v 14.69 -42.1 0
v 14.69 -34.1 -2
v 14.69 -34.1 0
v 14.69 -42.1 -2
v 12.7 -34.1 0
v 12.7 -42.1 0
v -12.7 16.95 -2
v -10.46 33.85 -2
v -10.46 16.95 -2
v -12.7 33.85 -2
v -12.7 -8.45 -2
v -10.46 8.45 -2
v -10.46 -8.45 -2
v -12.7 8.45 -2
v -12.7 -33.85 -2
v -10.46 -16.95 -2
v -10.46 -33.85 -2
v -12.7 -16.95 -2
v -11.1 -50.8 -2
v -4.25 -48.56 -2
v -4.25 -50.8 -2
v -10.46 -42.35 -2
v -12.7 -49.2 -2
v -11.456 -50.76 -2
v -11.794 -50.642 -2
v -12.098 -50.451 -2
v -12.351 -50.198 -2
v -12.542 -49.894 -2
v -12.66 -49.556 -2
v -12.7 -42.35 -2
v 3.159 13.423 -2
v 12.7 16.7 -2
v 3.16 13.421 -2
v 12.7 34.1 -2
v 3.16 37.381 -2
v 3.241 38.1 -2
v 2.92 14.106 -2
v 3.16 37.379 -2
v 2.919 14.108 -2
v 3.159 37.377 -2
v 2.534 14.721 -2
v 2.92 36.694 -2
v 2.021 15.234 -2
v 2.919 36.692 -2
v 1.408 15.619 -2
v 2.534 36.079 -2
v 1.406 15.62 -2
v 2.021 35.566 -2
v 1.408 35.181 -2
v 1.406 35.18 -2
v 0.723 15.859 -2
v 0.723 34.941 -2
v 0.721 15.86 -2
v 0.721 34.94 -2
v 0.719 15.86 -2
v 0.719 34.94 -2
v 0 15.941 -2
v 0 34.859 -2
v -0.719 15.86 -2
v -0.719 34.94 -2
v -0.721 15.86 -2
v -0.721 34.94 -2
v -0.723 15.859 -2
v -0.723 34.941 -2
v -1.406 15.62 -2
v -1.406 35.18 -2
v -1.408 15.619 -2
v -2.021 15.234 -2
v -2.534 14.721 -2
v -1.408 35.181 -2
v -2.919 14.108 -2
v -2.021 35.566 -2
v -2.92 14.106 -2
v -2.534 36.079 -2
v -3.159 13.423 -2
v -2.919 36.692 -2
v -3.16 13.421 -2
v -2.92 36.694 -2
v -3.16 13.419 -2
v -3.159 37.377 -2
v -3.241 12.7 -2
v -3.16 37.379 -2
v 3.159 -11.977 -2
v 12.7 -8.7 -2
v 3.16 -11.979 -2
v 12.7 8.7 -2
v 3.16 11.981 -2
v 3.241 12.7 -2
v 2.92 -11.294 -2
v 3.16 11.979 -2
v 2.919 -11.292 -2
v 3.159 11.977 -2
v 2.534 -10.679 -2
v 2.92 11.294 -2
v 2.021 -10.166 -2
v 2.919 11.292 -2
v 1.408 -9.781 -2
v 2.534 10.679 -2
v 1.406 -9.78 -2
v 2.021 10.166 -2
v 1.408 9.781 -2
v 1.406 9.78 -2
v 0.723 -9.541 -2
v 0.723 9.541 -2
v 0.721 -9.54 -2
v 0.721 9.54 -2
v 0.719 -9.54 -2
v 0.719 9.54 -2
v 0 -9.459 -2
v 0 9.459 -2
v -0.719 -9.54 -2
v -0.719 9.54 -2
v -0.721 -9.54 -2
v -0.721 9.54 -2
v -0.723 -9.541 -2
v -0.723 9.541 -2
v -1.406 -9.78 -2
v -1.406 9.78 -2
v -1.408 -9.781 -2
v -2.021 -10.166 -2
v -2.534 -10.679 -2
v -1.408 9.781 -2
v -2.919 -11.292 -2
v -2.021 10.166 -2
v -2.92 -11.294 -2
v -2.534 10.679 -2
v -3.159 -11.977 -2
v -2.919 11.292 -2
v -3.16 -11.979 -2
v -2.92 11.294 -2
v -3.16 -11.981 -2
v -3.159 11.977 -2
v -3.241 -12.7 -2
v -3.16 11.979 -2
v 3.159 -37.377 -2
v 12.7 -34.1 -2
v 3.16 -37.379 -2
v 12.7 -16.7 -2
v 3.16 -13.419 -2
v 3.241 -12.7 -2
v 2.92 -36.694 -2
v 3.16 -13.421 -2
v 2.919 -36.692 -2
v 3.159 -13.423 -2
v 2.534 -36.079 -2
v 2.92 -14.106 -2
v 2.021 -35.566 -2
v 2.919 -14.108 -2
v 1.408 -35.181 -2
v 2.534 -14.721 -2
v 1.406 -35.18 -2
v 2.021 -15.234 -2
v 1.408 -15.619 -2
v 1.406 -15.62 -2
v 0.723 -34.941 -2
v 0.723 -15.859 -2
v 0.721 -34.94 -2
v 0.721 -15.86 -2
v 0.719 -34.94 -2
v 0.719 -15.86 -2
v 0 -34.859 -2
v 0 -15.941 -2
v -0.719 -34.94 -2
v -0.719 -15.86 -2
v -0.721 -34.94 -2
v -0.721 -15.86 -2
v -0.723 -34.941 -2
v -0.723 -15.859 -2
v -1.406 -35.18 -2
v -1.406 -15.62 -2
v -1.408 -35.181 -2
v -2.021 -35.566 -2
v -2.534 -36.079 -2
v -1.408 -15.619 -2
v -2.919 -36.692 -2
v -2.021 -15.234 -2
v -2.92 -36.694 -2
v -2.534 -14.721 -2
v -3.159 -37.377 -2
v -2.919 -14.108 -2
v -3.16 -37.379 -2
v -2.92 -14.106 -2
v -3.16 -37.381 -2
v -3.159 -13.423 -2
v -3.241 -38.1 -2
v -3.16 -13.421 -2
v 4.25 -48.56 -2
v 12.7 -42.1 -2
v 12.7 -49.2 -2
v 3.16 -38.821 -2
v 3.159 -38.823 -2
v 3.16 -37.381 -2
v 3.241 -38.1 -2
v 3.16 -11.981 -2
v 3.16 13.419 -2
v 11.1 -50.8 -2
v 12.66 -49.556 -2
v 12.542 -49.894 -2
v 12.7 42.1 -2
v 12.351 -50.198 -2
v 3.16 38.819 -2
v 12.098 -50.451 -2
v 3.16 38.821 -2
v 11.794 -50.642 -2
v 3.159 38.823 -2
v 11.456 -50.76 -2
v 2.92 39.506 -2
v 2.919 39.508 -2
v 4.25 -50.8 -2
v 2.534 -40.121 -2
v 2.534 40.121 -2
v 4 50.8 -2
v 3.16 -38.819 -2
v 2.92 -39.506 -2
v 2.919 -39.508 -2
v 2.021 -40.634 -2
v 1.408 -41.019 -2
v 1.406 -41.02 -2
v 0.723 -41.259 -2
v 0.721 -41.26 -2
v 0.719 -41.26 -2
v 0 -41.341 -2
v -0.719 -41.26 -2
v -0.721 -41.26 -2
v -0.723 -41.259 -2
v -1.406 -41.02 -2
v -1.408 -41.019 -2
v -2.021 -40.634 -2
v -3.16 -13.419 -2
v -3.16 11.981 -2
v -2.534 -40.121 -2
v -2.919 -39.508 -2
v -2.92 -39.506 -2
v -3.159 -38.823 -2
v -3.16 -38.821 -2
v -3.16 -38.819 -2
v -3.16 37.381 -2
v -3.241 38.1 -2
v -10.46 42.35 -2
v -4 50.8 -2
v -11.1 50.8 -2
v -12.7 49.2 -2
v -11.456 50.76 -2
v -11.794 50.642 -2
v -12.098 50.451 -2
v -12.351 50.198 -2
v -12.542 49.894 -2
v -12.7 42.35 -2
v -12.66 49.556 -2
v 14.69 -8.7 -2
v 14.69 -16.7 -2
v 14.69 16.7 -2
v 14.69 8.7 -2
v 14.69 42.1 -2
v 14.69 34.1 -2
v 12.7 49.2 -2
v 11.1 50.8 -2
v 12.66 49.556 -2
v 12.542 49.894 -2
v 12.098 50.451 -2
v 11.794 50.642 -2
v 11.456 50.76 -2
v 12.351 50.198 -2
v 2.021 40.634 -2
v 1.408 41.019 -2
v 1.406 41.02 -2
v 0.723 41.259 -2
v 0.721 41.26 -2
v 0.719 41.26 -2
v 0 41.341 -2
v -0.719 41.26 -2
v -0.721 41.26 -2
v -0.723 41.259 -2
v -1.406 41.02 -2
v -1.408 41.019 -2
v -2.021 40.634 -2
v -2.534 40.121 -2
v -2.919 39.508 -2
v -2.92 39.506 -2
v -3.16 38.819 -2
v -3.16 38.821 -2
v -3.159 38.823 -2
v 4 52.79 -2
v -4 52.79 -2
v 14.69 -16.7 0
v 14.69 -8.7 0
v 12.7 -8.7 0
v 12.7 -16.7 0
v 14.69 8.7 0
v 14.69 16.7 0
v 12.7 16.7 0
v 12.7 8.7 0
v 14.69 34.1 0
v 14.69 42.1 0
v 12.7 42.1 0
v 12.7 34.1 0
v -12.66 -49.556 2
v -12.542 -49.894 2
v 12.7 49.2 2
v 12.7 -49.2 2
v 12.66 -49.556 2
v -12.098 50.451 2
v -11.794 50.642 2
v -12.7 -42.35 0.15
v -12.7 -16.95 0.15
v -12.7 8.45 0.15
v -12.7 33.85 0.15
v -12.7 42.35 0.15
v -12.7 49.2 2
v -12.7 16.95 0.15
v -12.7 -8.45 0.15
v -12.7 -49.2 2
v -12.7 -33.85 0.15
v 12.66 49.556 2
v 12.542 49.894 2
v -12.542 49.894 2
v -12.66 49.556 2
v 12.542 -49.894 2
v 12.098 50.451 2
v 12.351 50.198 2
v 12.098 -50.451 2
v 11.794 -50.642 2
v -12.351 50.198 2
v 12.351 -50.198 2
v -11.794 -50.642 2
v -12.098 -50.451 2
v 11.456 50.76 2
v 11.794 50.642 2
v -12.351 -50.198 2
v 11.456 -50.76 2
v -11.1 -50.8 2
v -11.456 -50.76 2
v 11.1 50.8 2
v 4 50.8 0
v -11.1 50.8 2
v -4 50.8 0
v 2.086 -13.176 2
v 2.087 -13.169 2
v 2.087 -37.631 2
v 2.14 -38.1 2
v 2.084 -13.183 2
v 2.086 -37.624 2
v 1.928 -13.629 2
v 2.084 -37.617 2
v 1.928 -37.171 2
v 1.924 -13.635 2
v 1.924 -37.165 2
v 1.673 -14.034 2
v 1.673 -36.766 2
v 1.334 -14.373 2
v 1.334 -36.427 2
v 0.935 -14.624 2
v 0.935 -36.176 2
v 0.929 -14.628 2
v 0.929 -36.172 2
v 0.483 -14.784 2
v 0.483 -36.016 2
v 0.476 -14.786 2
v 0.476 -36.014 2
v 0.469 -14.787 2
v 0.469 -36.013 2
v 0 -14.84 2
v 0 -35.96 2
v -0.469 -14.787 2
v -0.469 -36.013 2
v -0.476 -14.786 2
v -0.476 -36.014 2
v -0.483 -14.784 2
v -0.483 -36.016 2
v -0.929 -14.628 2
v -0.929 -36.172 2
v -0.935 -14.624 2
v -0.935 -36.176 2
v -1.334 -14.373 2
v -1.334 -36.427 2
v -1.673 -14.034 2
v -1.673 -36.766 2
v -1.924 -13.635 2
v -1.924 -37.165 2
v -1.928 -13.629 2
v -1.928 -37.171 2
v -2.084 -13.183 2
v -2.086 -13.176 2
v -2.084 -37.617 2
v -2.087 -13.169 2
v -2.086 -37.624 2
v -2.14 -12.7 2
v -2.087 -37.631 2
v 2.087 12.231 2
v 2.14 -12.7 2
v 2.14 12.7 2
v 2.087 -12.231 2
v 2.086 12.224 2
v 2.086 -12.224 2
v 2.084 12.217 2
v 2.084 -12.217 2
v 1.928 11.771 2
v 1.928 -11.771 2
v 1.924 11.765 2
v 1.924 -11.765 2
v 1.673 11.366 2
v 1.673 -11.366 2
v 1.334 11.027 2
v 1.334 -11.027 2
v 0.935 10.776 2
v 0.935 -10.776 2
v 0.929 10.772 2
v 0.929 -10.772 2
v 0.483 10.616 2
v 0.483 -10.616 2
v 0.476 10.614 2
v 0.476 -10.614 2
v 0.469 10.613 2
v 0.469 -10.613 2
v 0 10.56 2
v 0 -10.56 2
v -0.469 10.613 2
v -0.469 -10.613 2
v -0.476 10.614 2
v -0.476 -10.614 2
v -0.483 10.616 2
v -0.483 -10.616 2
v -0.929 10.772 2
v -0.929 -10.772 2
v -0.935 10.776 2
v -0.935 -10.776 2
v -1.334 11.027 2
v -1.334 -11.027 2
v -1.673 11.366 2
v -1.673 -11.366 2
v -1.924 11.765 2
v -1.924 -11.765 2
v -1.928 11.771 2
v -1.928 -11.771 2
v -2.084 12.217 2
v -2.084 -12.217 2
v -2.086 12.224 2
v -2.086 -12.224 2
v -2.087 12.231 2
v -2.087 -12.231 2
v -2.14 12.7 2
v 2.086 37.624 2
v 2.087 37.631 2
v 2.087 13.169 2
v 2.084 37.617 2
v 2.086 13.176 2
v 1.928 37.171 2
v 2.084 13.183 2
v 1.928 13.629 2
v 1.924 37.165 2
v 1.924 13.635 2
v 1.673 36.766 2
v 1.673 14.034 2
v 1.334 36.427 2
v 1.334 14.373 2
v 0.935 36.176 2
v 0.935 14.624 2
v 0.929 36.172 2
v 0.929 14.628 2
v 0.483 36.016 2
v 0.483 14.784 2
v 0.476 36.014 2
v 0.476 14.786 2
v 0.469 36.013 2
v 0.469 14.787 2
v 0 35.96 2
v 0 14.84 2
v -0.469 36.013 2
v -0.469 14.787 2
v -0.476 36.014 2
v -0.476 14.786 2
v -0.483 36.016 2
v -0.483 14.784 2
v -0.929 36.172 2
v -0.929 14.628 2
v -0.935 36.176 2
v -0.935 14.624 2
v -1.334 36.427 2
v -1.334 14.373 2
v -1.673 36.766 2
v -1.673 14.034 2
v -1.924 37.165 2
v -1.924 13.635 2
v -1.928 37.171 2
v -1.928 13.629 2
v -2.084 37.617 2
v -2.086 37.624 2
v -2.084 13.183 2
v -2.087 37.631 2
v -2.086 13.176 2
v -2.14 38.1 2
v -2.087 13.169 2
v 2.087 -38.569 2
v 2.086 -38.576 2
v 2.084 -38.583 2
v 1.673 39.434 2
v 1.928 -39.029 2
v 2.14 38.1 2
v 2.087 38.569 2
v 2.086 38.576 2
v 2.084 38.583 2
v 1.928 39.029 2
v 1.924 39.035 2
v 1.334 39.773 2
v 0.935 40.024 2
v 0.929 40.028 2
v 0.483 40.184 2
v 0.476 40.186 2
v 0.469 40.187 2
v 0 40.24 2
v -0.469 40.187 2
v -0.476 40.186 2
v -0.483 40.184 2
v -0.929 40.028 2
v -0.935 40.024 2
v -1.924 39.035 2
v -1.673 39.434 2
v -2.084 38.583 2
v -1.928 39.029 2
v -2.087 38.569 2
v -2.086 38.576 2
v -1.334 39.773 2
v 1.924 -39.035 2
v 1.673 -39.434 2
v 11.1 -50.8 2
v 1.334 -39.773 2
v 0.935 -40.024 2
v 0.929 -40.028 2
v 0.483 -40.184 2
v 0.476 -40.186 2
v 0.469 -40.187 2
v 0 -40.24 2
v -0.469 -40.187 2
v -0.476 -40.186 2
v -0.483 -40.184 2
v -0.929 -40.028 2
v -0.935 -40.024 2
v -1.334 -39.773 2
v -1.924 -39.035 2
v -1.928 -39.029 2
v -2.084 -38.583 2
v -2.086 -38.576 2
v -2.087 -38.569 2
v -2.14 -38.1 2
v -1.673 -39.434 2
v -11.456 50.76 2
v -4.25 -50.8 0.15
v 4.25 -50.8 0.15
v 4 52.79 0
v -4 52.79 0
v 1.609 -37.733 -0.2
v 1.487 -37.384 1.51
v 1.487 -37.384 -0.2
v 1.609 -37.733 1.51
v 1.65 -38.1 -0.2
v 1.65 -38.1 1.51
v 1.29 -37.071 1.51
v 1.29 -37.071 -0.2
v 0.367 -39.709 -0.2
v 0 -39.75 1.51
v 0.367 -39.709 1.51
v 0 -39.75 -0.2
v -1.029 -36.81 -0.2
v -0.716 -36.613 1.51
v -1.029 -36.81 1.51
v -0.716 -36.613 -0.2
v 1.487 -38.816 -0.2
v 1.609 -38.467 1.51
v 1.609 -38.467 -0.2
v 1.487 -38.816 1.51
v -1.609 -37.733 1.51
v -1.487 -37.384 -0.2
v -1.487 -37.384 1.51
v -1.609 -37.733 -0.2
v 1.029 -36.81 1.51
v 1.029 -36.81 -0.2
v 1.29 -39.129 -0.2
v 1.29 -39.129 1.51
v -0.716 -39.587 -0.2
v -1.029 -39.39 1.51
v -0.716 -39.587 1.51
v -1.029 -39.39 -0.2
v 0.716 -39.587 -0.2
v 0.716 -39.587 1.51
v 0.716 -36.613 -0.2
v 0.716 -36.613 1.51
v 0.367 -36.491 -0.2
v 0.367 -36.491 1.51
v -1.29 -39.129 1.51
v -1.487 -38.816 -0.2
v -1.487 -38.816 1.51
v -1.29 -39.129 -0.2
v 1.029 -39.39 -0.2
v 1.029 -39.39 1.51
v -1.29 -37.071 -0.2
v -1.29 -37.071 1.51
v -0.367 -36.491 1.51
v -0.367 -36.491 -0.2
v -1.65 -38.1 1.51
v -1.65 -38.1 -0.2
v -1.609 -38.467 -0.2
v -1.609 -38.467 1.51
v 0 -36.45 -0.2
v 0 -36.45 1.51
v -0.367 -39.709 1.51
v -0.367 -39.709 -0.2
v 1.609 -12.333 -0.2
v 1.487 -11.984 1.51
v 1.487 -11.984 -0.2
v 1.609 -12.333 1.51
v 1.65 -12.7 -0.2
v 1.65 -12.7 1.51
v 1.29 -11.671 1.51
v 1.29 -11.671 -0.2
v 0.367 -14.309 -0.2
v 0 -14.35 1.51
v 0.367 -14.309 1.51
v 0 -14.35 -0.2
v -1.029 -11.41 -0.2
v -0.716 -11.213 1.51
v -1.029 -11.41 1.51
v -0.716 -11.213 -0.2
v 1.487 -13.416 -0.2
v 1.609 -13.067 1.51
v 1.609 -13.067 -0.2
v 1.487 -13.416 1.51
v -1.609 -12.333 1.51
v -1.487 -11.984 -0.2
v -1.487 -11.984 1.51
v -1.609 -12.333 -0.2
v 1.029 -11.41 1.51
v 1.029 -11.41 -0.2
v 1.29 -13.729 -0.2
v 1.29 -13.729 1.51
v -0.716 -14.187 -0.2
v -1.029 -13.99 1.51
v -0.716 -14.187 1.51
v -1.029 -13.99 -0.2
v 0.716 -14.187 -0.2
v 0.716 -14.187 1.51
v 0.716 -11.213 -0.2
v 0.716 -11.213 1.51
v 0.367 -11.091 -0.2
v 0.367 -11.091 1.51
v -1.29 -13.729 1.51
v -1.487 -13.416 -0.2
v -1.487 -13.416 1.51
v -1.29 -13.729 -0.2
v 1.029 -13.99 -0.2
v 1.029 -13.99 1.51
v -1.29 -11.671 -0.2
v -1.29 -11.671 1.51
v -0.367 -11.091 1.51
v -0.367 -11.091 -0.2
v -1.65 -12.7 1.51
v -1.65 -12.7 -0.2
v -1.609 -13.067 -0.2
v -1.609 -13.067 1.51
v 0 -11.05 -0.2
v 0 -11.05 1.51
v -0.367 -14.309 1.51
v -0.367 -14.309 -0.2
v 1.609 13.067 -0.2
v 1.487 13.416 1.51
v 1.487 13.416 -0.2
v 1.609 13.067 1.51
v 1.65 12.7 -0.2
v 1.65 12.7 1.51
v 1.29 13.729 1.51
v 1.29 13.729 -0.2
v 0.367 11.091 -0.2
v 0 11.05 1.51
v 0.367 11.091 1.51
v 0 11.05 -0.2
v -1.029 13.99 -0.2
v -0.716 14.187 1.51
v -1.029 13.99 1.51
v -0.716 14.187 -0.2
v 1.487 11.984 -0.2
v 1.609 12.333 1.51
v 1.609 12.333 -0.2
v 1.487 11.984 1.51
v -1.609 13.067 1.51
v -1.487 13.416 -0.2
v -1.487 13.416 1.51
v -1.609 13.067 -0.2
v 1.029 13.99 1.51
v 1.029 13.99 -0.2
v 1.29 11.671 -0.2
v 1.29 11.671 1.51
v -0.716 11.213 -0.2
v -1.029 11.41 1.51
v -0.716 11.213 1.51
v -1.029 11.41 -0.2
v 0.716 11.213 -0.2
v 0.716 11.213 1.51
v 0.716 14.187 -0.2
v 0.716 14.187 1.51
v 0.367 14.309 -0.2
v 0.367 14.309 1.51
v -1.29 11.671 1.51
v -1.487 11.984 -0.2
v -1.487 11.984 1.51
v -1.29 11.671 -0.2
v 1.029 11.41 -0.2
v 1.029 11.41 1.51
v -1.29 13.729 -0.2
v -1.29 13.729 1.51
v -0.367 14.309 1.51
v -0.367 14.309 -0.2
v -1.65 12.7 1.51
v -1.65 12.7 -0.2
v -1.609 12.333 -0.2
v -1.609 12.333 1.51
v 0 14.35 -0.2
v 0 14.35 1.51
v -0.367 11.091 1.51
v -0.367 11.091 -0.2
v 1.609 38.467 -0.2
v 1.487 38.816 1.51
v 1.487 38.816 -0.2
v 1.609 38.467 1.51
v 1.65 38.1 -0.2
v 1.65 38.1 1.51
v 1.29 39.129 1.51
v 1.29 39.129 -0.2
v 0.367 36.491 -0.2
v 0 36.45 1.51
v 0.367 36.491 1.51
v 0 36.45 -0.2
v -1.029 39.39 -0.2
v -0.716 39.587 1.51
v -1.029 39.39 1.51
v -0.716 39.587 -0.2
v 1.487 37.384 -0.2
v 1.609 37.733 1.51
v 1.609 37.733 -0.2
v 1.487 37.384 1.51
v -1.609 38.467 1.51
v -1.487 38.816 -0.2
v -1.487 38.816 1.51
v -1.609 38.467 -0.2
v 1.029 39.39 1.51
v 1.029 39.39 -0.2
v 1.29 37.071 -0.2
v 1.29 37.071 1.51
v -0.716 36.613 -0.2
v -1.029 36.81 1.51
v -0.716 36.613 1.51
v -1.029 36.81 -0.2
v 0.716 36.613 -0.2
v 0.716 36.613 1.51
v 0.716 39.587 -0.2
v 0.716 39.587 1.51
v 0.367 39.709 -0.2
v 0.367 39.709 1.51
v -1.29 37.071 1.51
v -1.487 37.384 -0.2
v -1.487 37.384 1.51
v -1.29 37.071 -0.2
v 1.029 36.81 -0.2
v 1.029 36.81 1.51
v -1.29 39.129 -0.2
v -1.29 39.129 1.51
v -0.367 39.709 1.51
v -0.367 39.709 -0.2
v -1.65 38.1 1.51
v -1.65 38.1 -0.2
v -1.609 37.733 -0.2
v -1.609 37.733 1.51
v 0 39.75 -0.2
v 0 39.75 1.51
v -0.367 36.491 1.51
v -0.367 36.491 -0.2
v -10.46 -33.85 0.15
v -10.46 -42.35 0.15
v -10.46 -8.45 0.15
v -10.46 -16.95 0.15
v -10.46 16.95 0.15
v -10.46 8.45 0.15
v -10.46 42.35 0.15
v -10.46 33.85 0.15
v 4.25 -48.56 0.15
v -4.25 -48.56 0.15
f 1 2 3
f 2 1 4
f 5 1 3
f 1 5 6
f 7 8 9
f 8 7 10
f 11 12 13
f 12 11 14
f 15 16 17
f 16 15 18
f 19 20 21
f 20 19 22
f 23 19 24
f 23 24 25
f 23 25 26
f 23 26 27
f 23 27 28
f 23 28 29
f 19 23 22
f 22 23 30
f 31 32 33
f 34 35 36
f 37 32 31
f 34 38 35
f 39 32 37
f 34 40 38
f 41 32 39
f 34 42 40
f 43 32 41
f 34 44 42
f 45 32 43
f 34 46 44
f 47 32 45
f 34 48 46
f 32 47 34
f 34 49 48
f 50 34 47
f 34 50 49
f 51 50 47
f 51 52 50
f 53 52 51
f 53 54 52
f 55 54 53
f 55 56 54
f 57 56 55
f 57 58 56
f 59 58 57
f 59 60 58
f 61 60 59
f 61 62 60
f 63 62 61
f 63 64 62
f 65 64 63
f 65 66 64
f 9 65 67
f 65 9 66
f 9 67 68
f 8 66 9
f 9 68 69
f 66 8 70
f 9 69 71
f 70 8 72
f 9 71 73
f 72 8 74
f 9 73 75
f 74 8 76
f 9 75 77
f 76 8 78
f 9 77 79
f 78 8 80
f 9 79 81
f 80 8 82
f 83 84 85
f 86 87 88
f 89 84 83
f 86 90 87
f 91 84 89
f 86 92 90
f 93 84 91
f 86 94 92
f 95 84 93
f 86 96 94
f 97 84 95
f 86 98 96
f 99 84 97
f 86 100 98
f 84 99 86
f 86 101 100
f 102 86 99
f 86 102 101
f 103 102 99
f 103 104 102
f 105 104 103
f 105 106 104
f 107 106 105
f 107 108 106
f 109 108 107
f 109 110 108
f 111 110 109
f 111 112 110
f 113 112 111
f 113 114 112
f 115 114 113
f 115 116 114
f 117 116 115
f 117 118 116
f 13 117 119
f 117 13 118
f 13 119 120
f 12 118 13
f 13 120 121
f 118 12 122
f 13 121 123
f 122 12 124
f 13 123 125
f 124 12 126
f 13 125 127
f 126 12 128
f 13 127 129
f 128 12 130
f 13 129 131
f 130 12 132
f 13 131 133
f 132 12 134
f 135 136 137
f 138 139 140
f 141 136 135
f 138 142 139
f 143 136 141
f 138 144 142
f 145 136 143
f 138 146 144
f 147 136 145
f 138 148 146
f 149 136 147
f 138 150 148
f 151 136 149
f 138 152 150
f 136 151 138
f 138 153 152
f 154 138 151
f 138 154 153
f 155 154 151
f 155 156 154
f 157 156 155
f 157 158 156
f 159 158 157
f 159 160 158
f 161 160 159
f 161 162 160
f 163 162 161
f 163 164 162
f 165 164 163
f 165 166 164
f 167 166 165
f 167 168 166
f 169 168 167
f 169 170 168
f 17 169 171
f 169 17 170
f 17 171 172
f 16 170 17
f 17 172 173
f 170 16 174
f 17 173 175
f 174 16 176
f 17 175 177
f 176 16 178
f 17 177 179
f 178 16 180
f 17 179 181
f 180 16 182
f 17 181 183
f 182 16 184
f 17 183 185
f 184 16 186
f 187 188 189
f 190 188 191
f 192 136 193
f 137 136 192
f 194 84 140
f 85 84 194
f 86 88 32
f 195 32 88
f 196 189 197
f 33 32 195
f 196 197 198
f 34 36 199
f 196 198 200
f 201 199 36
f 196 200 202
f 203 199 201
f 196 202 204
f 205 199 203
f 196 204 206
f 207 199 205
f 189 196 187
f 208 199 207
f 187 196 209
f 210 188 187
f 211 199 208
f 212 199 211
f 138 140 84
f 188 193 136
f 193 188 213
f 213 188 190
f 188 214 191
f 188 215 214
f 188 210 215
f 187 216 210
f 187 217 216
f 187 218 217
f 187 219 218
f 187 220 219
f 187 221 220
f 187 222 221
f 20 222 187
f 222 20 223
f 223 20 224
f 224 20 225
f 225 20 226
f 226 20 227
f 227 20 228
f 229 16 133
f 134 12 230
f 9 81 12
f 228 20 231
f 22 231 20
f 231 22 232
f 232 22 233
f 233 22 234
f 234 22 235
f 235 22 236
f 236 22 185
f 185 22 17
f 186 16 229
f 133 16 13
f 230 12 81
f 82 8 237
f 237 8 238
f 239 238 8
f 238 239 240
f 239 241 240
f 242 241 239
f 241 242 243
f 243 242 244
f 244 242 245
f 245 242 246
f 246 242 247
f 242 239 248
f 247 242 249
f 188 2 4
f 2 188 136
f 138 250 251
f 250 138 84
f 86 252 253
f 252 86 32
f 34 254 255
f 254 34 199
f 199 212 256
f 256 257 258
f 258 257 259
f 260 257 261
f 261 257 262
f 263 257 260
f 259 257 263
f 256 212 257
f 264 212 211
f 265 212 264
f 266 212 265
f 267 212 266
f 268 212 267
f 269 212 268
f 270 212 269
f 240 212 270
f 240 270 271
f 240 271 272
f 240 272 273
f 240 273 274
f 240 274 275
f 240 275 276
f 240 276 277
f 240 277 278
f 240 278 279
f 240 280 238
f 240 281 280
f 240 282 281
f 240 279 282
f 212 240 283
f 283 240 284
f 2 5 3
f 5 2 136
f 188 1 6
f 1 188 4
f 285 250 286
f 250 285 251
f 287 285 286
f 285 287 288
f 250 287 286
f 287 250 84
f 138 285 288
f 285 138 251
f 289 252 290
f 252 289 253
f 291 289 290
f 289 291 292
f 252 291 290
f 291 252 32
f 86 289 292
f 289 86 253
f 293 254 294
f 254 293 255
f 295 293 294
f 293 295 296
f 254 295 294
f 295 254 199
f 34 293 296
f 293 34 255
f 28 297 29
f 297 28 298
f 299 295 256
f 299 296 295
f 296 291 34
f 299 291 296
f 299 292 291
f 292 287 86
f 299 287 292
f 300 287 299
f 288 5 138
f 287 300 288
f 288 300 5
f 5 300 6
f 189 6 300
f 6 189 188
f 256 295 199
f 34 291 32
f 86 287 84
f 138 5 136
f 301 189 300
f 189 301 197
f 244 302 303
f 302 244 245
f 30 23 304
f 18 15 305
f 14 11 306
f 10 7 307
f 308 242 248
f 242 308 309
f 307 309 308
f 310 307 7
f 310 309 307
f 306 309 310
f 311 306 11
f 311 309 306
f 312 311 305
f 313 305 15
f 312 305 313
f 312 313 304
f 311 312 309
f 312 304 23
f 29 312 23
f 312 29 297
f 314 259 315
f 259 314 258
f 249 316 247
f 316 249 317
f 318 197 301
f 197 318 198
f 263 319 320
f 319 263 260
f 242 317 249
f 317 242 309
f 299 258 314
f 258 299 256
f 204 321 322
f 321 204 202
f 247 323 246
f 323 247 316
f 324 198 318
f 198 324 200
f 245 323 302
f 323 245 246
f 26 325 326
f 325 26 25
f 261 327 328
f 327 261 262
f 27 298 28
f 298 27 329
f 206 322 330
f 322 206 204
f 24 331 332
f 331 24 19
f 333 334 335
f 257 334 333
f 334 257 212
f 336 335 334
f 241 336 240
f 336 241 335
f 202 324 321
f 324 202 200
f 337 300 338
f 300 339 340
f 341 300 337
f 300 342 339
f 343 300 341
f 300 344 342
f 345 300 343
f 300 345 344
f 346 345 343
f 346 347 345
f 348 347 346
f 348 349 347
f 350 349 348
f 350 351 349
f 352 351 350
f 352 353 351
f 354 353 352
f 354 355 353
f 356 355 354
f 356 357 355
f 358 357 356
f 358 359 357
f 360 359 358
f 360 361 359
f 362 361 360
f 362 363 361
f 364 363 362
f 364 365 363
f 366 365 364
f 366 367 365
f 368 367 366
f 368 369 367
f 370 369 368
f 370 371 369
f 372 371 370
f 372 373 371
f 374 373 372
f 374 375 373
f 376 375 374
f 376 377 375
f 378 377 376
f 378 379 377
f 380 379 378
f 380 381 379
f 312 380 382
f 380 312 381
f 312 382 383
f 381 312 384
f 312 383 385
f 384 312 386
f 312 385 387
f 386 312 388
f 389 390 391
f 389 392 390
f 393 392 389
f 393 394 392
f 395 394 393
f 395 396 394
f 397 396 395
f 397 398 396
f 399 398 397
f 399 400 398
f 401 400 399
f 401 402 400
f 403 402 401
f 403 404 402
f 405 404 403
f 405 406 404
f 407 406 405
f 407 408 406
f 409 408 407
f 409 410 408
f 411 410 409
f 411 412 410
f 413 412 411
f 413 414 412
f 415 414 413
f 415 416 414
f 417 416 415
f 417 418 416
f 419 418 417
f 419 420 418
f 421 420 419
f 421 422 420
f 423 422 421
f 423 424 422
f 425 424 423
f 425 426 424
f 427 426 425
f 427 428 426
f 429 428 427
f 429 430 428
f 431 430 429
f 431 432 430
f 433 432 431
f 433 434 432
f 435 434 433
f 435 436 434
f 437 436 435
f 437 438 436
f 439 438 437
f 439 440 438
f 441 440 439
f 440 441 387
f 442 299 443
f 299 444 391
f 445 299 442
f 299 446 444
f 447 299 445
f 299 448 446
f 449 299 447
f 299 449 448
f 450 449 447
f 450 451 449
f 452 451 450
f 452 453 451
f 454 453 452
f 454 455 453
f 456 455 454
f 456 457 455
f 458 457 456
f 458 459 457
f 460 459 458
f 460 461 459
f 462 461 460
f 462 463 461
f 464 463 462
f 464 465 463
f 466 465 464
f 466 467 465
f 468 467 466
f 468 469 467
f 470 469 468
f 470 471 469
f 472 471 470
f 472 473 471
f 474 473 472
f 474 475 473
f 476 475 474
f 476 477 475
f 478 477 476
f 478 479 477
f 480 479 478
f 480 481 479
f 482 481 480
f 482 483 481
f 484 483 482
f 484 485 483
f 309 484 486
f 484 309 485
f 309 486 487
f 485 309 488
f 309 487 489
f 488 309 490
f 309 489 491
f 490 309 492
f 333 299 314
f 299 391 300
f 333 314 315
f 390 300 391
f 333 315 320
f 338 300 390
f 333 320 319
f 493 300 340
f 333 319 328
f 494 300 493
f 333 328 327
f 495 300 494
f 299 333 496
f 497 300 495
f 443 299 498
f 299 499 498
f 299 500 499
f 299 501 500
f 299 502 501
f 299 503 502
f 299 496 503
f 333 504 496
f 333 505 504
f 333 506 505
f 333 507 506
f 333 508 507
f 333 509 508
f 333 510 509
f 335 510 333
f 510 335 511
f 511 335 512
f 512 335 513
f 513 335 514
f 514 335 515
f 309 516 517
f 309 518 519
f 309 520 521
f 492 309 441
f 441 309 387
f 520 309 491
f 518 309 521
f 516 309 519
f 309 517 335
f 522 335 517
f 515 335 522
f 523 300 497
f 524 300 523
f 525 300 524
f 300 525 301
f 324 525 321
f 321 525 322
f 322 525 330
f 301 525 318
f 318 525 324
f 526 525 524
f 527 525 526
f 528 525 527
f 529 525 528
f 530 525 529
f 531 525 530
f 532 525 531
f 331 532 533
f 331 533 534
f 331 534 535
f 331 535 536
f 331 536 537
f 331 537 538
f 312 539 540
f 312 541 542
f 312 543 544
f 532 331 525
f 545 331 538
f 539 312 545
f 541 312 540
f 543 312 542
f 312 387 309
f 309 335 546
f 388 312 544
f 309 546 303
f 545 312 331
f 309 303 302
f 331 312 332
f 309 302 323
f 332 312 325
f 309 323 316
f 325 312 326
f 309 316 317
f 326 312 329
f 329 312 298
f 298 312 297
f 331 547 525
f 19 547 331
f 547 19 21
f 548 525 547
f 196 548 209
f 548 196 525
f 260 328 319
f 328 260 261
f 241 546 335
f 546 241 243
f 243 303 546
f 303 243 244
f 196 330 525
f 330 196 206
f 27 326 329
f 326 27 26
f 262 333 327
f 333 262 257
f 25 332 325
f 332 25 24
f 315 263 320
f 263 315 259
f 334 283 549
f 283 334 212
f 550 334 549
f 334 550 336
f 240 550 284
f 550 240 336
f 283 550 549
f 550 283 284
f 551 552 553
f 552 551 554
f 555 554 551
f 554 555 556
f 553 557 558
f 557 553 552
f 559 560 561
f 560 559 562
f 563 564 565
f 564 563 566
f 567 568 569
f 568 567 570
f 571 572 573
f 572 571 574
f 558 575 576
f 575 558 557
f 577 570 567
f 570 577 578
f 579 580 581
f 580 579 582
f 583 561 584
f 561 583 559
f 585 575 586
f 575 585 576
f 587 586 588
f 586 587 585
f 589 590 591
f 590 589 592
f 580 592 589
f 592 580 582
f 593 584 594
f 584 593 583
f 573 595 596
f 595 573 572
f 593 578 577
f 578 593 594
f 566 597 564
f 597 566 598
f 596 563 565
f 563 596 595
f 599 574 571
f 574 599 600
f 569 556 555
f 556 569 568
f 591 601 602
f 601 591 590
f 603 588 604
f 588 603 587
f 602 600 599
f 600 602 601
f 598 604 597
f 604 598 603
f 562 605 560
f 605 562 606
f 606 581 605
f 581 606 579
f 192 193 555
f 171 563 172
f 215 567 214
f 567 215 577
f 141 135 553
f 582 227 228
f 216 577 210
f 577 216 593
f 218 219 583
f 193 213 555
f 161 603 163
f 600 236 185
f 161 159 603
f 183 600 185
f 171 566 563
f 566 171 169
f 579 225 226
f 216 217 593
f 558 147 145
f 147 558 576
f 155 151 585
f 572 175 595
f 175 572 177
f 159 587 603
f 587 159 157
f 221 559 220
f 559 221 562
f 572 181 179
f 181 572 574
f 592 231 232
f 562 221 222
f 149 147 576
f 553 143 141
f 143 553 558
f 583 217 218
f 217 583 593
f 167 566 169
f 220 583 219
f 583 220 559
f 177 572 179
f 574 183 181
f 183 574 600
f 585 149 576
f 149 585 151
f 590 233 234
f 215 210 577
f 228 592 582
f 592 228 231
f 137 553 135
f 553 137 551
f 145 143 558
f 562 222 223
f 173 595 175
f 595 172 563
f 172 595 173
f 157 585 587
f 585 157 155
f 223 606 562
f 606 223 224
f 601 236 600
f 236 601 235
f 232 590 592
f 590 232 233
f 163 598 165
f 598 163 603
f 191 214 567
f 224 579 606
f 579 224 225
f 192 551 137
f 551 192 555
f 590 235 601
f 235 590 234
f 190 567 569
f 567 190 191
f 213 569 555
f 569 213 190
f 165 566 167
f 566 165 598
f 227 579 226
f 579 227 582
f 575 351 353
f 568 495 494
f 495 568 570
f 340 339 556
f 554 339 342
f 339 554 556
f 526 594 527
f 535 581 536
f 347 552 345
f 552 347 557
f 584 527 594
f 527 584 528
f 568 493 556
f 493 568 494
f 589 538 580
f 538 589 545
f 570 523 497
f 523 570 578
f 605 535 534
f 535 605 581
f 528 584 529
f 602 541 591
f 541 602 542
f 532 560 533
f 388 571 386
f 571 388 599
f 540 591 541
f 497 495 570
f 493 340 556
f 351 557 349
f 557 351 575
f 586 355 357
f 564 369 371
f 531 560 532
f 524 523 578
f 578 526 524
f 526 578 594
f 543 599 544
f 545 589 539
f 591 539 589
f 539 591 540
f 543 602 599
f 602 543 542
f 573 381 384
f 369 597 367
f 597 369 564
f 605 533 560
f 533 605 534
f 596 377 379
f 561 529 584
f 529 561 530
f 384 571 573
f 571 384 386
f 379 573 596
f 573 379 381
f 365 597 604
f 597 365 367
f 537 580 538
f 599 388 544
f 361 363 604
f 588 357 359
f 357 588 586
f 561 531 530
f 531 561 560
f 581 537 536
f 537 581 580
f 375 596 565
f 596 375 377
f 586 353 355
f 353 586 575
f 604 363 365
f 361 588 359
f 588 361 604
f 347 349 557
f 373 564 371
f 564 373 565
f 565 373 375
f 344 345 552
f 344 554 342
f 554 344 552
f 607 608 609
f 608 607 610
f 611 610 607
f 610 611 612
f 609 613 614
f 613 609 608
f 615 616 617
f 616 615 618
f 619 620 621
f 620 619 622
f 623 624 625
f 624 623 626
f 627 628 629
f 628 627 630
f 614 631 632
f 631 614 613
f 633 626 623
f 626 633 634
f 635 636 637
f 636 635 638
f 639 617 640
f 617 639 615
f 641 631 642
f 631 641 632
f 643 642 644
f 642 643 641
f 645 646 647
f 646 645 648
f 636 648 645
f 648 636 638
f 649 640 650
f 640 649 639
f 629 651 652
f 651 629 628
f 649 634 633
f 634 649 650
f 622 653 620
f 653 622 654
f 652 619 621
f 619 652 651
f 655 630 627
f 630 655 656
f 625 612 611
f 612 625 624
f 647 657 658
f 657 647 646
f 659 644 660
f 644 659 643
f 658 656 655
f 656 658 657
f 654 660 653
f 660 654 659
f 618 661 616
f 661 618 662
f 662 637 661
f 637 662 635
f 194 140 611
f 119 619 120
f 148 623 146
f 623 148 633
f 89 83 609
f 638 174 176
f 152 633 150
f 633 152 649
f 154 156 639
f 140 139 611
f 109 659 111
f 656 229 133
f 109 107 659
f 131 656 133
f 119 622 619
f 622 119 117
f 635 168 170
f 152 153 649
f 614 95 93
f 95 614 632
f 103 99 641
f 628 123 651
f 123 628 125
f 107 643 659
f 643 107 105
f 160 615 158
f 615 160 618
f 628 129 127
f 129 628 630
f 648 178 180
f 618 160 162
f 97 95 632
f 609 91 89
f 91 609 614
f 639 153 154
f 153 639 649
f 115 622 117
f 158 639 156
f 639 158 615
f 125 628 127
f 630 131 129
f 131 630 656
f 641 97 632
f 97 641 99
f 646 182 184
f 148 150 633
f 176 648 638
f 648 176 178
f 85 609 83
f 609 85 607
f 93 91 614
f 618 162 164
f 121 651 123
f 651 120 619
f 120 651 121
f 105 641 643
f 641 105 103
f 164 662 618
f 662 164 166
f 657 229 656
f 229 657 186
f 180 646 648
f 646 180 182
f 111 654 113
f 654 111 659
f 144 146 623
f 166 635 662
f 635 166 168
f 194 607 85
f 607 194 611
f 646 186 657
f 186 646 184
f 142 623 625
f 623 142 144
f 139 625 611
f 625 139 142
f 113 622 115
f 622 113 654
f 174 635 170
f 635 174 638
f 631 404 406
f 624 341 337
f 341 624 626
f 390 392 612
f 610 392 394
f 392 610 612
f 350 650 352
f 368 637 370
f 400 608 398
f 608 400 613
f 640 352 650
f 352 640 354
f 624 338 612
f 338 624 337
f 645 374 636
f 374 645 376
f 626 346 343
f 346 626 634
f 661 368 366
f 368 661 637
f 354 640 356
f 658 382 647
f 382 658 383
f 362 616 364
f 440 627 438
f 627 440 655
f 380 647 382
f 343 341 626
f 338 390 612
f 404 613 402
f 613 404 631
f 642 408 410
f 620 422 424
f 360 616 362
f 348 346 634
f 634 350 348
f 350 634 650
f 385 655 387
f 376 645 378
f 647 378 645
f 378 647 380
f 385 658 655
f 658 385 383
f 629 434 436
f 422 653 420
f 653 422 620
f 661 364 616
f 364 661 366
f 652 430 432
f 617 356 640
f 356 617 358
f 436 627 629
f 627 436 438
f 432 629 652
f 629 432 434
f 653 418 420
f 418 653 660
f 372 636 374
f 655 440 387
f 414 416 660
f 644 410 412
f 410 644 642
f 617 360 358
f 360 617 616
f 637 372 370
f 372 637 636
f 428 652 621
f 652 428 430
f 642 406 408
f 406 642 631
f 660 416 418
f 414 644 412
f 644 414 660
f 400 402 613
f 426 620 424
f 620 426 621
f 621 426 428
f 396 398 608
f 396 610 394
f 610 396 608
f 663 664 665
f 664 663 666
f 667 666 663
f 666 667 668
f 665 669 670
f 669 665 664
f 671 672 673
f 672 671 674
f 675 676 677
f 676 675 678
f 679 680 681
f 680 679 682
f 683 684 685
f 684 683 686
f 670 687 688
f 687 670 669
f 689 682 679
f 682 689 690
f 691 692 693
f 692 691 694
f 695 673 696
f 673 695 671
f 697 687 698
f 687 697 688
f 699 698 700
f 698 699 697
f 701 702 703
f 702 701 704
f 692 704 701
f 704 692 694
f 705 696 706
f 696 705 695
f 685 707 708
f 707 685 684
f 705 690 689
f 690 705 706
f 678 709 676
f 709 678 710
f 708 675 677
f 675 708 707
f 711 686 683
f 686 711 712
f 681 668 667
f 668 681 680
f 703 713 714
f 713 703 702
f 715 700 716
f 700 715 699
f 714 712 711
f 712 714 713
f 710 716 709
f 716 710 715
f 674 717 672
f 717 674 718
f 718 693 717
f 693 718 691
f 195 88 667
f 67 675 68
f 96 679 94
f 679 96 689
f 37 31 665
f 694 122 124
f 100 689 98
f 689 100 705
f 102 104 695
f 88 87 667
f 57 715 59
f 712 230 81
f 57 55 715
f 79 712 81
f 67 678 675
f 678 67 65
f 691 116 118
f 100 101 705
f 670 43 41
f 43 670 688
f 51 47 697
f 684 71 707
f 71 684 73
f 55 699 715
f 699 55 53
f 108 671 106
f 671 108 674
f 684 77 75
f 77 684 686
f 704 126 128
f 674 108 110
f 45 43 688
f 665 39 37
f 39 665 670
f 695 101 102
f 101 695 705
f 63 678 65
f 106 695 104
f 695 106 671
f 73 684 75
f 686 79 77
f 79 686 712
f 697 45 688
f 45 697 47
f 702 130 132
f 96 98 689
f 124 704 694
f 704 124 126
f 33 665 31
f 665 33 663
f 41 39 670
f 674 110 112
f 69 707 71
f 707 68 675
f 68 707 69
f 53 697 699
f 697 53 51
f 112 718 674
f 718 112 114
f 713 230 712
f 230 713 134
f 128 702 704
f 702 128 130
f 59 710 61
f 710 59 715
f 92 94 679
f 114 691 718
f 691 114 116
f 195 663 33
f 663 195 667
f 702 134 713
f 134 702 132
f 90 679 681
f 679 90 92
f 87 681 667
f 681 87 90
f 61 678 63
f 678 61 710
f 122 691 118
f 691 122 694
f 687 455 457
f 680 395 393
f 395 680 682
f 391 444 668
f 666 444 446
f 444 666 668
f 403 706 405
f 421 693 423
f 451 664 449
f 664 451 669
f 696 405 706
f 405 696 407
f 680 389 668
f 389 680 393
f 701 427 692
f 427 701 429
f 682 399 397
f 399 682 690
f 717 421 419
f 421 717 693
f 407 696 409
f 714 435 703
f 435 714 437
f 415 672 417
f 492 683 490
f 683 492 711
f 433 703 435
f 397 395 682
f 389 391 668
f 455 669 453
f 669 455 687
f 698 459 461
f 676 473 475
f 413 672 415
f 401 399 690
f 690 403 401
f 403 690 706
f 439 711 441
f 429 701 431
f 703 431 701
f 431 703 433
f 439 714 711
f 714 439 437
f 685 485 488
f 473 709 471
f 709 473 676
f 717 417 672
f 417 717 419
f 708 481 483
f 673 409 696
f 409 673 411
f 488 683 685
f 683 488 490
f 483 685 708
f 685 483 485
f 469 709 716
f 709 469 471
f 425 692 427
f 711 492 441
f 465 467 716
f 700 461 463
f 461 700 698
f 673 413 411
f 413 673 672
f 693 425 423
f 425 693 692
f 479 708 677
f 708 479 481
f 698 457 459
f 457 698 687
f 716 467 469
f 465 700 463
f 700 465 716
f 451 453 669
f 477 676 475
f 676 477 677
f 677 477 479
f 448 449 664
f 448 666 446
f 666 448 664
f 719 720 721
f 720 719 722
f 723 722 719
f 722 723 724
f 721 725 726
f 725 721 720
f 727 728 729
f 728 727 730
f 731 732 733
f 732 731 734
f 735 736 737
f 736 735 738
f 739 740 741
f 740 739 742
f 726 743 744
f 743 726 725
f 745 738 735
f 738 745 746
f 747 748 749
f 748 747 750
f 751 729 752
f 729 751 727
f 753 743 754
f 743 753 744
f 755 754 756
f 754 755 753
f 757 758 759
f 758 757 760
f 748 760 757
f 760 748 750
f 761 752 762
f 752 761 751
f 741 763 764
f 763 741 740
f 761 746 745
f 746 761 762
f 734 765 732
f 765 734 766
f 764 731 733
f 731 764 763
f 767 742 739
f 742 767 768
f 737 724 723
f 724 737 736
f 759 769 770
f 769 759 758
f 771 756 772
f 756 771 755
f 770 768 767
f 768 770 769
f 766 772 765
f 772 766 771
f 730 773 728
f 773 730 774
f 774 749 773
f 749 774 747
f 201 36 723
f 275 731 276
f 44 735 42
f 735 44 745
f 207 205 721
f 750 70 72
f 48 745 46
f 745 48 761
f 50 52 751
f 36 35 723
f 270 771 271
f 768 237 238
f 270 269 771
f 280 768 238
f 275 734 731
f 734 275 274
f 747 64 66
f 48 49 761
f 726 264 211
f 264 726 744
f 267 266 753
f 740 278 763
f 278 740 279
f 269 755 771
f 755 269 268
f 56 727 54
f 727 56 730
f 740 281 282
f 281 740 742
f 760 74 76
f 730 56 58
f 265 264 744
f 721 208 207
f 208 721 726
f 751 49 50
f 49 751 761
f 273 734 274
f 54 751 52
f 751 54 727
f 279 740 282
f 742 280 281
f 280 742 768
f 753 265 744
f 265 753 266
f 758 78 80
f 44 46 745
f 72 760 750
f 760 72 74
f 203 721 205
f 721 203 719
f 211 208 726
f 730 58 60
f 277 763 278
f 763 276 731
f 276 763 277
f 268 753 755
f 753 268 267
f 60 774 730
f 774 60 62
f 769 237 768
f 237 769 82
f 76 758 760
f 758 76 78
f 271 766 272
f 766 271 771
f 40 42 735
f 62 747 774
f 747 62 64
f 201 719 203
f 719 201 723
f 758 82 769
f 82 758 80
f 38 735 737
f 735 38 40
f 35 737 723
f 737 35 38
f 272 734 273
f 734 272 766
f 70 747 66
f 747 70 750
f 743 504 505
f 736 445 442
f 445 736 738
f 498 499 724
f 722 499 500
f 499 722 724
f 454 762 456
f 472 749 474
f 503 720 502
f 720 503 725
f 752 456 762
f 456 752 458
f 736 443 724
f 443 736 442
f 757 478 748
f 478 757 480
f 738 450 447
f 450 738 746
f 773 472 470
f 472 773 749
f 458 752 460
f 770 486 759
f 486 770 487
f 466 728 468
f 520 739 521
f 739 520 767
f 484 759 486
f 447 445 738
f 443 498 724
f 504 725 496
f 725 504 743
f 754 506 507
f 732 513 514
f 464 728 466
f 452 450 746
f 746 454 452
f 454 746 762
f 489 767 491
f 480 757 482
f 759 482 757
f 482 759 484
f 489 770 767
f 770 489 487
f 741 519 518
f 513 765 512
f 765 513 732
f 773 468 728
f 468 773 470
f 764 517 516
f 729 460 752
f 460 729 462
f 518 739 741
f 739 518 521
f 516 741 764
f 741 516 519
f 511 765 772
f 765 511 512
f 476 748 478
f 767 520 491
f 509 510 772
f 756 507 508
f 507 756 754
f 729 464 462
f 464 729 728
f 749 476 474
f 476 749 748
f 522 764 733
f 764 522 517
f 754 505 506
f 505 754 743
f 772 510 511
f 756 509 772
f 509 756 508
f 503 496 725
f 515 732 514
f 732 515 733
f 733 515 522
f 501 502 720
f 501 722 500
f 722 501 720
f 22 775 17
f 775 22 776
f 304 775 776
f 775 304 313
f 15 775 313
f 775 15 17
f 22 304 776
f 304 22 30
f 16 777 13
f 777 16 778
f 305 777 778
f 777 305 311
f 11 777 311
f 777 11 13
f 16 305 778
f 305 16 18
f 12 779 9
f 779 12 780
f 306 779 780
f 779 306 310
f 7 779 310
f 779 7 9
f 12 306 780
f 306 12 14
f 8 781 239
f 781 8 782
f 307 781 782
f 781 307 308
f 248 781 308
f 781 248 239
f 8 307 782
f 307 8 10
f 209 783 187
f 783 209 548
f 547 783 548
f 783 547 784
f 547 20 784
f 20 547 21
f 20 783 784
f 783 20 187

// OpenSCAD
// Modular 1.00 in control-panel grid.
// Print with the countersink face on the bed. No supports.
// Parts: strip_1x4 strip_2x4 strip_3x4 strip_4x4 strip_5x4
//        join_bar
//        adapter_4991 adapter_5295 adapter_5752 adapter_6310
//        faceplate_4991 faceplate_5295 faceplate_5752 faceplate_6310

/* [Part] */
PART = "strip_1x4"; // ["strip_1x4","strip_2x4","strip_3x4","strip_4x4","strip_5x4","join_bar","adapter_4991","adapter_5295","adapter_5752","adapter_6310","faceplate_4991","faceplate_5295","faceplate_5752","faceplate_6310"]

PITCH = 25.4;
THICK = 4.0;
HOLE = 3.3;          // M3 clearance
CSINK_D = 6.5;
CSINK_H = 1.8;
CHAMFER = 0.5;
CORNER_R = 1.6;
TONGUE_W = 8.0;
TONGUE_T = 2.0;
TONGUE_OUT = 2.0;
TONGUE_CLEAR = 0.25;
$fn = 28;

module rounded_rect(w, h, r) {
    if (r <= 0) square([w, h], center = true);
    else hull() {
        translate([ w/2 - r,  h/2 - r]) circle(r = r);
        translate([-w/2 + r,  h/2 - r]) circle(r = r);
        translate([ w/2 - r, -h/2 + r]) circle(r = r);
        translate([-w/2 + r, -h/2 + r]) circle(r = r);
    }
}

module countersunk_hole() {
    union() {
        cylinder(h = THICK + 2, d = HOLE, center = true);
        translate([0, 0, -THICK/2 - 0.01])
            cylinder(h = CSINK_H + 0.01, d1 = CSINK_D, d2 = HOLE);
        translate([0, 0, THICK/2 - CHAMFER + 0.01])
            cylinder(h = CHAMFER, d1 = HOLE, d2 = HOLE + 2 * CHAMFER);
    }
}

module tongue_groove(nx, ny, w, h) {
    // Tongues on +X and +Y (bottom 2 mm). Grooves on -X and -Y.
    for (iy = [0:ny-1]) {
        y = -h/2 + (iy + 0.5) * PITCH;
        translate([w/2 + TONGUE_OUT/2, y, -THICK/2 + TONGUE_T/2])
            cube([TONGUE_OUT, TONGUE_W, TONGUE_T], center = true);
        translate([-w/2 + TONGUE_OUT/2, y, -THICK/2 + TONGUE_T/2])
            cube([TONGUE_OUT + TONGUE_CLEAR, TONGUE_W + 2*TONGUE_CLEAR, TONGUE_T + 0.2], center = true);
    }
    for (ix = [0:nx-1]) {
        x = -w/2 + (ix + 0.5) * PITCH;
        translate([x, h/2 + TONGUE_OUT/2, -THICK/2 + TONGUE_T/2])
            cube([TONGUE_W, TONGUE_OUT, TONGUE_T], center = true);
        translate([x, -h/2 + TONGUE_OUT/2, -THICK/2 + TONGUE_T/2])
            cube([TONGUE_W + 2*TONGUE_CLEAR, TONGUE_OUT + TONGUE_CLEAR, TONGUE_T + 0.2], center = true);
    }
}

module strip(nx, ny) {
    w = nx * PITCH;
    h = ny * PITCH;
    difference() {
        union() {
            translate([0, 0, 0])
                linear_extrude(height = THICK, center = true)
                    rounded_rect(w, h, CORNER_R);
            // +X +Y tongues (solid)
            for (iy = [0:ny-1]) {
                y = -h/2 + (iy + 0.5) * PITCH;
                translate([w/2 + TONGUE_OUT/2 - 0.01, y, -THICK/2 + TONGUE_T/2])
                    cube([TONGUE_OUT, TONGUE_W, TONGUE_T], center = true);
            }
            for (ix = [0:nx-1]) {
                x = -w/2 + (ix + 0.5) * PITCH;
                translate([x, h/2 + TONGUE_OUT/2 - 0.01, -THICK/2 + TONGUE_T/2])
                    cube([TONGUE_W, TONGUE_OUT, TONGUE_T], center = true);
            }
        }
        // 1 in grid of M3 holes, cell centers
        for (ix = [0:nx-1], iy = [0:ny-1]) {
            x = -w/2 + (ix + 0.5) * PITCH;
            y = -h/2 + (iy + 0.5) * PITCH;
            translate([x, y, 0]) countersunk_hole();
        }
        // -X -Y grooves
        for (iy = [0:ny-1]) {
            y = -h/2 + (iy + 0.5) * PITCH;
            translate([-w/2 + (TONGUE_OUT + TONGUE_CLEAR)/2 - 0.01, y, -THICK/2 + TONGUE_T/2])
                cube([TONGUE_OUT + TONGUE_CLEAR, TONGUE_W + 2*TONGUE_CLEAR, TONGUE_T + 0.3], center = true);
        }
        for (ix = [0:nx-1]) {
            x = -w/2 + (ix + 0.5) * PITCH;
            translate([x, -h/2 + (TONGUE_OUT + TONGUE_CLEAR)/2 - 0.01, -THICK/2 + TONGUE_T/2])
                cube([TONGUE_W + 2*TONGUE_CLEAR, TONGUE_OUT + TONGUE_CLEAR, TONGUE_T + 0.3], center = true);
        }
    }
}

module join_bar() {
    // Two-hole bar that sits under a seam. 25.4 mm pitch.
    bw = 12;
    bl = 40;
    bt = 3.0;
    difference() {
        linear_extrude(height = bt, center = true)
            rounded_rect(bl, bw, 1.2);
        for (s = [-1, 1])
            translate([s * PITCH/2, 0, 0]) {
                cylinder(h = bt + 2, d = HOLE, center = true);
                translate([0, 0, -bt/2 - 0.01])
                    cylinder(h = 1.2, d1 = 6.2, d2 = HOLE);
            }
    }
}

module m3_clear(h=4) {
    cylinder(h = h + 2, d = HOLE, center = true);
}

module m25_clear(h=4) {
    cylinder(h = h + 2, d = 2.7, center = true); // M2.5 clearance
}

// Adapter plates sit on the 1 in standoffs. Board screws into the M2.5 holes.
module adapter_plate(nx, ny, thick=2.4) {
    w = nx * PITCH;
    h = ny * PITCH;
    linear_extrude(height = thick, center = true)
        rounded_rect(w, h, 1.2);
}

module adapter_4991() {
    // 1x2 cell so two M3 standoffs stop rotation. Board is 1 in square.
    nx = 1; ny = 2; t = 2.4;
    w = nx * PITCH; h = ny * PITCH;
    difference() {
        adapter_plate(nx, ny, t);
        for (iy = [0:ny-1]) {
            y = -h/2 + (iy + 0.5) * PITCH;
            translate([0, y, 0]) m3_clear(t);
        }
        // Board origin at lower-left of the lower cell, offset so board is centered on lower cell.
        // Lower cell center is (0, -PITCH/2). Board LL is center - 12.7.
        bx = -12.7;
        by = -PITCH/2 - 12.7;
        for (p = [[2.54,2.54],[22.86,2.54],[2.54,22.86],[22.86,22.86]])
            translate([bx + p[0], by + p[1], 0]) m25_clear(t);
        // cable window under STEMMA QT (left/right of board)
        translate([0, -PITCH/2, 0]) cube([12, 8, t+2], center = true);
    }
}

module adapter_5295() {
    // 1x4, board 76.2 x 21.59 centered.
    nx = 1; ny = 4; t = 2.4;
    w = nx * PITCH; h = ny * PITCH;
    difference() {
        adapter_plate(nx, ny, t);
        for (iy = [0:ny-1]) {
            y = -h/2 + (iy + 0.5) * PITCH;
            translate([0, y, 0]) m3_clear(t);
        }
        for (p = [[19.05,8.255],[-19.05,8.255],[19.05,-8.255],[-19.05,-8.255]])
            // board long axis along Y (the 4 in length)
            translate([p[1], p[0], 0]) m25_clear(t);
        // QT cable window
        translate([0, 0, 0]) cube([10, 20, t+2], center = true);
    }
}

module adapter_5752() {
    adapter_5295(); // same outline and mounting holes
}

module adapter_6310() {
    nx = 2; ny = 2; t = 2.4;
    w = nx * PITCH; h = ny * PITCH;
    difference() {
        adapter_plate(nx, ny, t);
        for (ix = [0:nx-1], iy = [0:ny-1]) {
            x = -w/2 + (ix + 0.5) * PITCH;
            y = -h/2 + (iy + 0.5) * PITCH;
            translate([x, y, 0]) m3_clear(t);
        }
        for (p = [[15.24,17.78],[-15.24,17.78],[15.24,-17.78],[-15.24,-17.78]])
            translate([p[0], p[1], 0]) m25_clear(t);
        // leave the 4 mm encoder posts clear
        for (p = [[0,15],[0,-15],[15,0],[-15,0]])
            translate([p[0], p[1], 0]) cylinder(h = t+2, d = 4.4, center = true);
        translate([0, 0, 0]) cube([16, 10, t+2], center = true);
    }
}

module faceplate_blank(nx, ny, t=2.6) {
    w = nx * PITCH; h = ny * PITCH;
    difference() {
        linear_extrude(height = t, center = true)
            rounded_rect(w, h, 1.2);
        for (ix = [0:nx-1], iy = [0:ny-1]) {
            x = -w/2 + (ix + 0.5) * PITCH;
            y = -h/2 + (iy + 0.5) * PITCH;
            translate([x, y, 0]) cylinder(h = t+2, d = HOLE, center = true);
        }
    }
}

module faceplate_4991() {
    nx = 1; ny = 2; t = 2.6;
    w = nx * PITCH; h = ny * PITCH;
    difference() {
        faceplate_blank(nx, ny, t);
        // shaft over lower cell
        translate([0, -PITCH/2, 0]) cylinder(h = t+2, d = 7.5, center = true);
    }
}

module faceplate_5295() {
    nx = 1; ny = 4; t = 2.6;
    difference() {
        faceplate_blank(nx, ny, t);
        // slider slot along length
        cube([4.0, 75.0, t+2], center = true);
    }
}

module faceplate_5752() {
    nx = 1; ny = 4; t = 2.6;
    difference() {
        faceplate_blank(nx, ny, t);
        for (y = [-28.575, -9.525, 9.525, 28.575])
            translate([0, y, 0]) cylinder(h = t+2, d = 7.5, center = true);
    }
}

module faceplate_6310() {
    nx = 2; ny = 2; t = 2.6;
    difference() {
        faceplate_blank(nx, ny, t);
        cylinder(h = t+2, d = 22.0, center = true);
    }
}

if (PART == "strip_1x4") strip(1, 4);
else if (PART == "strip_2x4") strip(2, 4);
else if (PART == "strip_3x4") strip(3, 4);
else if (PART == "strip_4x4") strip(4, 4);
else if (PART == "strip_5x4") strip(5, 4);
else if (PART == "join_bar") join_bar();
else if (PART == "adapter_4991") adapter_4991();
else if (PART == "adapter_5295") adapter_5295();
else if (PART == "adapter_5752") adapter_5752();
else if (PART == "adapter_6310") adapter_6310();
else if (PART == "faceplate_4991") faceplate_4991();
else if (PART == "faceplate_5295") faceplate_5295();
else if (PART == "faceplate_5752") faceplate_5752();
else if (PART == "faceplate_6310") faceplate_6310();
else strip(1, 4);
